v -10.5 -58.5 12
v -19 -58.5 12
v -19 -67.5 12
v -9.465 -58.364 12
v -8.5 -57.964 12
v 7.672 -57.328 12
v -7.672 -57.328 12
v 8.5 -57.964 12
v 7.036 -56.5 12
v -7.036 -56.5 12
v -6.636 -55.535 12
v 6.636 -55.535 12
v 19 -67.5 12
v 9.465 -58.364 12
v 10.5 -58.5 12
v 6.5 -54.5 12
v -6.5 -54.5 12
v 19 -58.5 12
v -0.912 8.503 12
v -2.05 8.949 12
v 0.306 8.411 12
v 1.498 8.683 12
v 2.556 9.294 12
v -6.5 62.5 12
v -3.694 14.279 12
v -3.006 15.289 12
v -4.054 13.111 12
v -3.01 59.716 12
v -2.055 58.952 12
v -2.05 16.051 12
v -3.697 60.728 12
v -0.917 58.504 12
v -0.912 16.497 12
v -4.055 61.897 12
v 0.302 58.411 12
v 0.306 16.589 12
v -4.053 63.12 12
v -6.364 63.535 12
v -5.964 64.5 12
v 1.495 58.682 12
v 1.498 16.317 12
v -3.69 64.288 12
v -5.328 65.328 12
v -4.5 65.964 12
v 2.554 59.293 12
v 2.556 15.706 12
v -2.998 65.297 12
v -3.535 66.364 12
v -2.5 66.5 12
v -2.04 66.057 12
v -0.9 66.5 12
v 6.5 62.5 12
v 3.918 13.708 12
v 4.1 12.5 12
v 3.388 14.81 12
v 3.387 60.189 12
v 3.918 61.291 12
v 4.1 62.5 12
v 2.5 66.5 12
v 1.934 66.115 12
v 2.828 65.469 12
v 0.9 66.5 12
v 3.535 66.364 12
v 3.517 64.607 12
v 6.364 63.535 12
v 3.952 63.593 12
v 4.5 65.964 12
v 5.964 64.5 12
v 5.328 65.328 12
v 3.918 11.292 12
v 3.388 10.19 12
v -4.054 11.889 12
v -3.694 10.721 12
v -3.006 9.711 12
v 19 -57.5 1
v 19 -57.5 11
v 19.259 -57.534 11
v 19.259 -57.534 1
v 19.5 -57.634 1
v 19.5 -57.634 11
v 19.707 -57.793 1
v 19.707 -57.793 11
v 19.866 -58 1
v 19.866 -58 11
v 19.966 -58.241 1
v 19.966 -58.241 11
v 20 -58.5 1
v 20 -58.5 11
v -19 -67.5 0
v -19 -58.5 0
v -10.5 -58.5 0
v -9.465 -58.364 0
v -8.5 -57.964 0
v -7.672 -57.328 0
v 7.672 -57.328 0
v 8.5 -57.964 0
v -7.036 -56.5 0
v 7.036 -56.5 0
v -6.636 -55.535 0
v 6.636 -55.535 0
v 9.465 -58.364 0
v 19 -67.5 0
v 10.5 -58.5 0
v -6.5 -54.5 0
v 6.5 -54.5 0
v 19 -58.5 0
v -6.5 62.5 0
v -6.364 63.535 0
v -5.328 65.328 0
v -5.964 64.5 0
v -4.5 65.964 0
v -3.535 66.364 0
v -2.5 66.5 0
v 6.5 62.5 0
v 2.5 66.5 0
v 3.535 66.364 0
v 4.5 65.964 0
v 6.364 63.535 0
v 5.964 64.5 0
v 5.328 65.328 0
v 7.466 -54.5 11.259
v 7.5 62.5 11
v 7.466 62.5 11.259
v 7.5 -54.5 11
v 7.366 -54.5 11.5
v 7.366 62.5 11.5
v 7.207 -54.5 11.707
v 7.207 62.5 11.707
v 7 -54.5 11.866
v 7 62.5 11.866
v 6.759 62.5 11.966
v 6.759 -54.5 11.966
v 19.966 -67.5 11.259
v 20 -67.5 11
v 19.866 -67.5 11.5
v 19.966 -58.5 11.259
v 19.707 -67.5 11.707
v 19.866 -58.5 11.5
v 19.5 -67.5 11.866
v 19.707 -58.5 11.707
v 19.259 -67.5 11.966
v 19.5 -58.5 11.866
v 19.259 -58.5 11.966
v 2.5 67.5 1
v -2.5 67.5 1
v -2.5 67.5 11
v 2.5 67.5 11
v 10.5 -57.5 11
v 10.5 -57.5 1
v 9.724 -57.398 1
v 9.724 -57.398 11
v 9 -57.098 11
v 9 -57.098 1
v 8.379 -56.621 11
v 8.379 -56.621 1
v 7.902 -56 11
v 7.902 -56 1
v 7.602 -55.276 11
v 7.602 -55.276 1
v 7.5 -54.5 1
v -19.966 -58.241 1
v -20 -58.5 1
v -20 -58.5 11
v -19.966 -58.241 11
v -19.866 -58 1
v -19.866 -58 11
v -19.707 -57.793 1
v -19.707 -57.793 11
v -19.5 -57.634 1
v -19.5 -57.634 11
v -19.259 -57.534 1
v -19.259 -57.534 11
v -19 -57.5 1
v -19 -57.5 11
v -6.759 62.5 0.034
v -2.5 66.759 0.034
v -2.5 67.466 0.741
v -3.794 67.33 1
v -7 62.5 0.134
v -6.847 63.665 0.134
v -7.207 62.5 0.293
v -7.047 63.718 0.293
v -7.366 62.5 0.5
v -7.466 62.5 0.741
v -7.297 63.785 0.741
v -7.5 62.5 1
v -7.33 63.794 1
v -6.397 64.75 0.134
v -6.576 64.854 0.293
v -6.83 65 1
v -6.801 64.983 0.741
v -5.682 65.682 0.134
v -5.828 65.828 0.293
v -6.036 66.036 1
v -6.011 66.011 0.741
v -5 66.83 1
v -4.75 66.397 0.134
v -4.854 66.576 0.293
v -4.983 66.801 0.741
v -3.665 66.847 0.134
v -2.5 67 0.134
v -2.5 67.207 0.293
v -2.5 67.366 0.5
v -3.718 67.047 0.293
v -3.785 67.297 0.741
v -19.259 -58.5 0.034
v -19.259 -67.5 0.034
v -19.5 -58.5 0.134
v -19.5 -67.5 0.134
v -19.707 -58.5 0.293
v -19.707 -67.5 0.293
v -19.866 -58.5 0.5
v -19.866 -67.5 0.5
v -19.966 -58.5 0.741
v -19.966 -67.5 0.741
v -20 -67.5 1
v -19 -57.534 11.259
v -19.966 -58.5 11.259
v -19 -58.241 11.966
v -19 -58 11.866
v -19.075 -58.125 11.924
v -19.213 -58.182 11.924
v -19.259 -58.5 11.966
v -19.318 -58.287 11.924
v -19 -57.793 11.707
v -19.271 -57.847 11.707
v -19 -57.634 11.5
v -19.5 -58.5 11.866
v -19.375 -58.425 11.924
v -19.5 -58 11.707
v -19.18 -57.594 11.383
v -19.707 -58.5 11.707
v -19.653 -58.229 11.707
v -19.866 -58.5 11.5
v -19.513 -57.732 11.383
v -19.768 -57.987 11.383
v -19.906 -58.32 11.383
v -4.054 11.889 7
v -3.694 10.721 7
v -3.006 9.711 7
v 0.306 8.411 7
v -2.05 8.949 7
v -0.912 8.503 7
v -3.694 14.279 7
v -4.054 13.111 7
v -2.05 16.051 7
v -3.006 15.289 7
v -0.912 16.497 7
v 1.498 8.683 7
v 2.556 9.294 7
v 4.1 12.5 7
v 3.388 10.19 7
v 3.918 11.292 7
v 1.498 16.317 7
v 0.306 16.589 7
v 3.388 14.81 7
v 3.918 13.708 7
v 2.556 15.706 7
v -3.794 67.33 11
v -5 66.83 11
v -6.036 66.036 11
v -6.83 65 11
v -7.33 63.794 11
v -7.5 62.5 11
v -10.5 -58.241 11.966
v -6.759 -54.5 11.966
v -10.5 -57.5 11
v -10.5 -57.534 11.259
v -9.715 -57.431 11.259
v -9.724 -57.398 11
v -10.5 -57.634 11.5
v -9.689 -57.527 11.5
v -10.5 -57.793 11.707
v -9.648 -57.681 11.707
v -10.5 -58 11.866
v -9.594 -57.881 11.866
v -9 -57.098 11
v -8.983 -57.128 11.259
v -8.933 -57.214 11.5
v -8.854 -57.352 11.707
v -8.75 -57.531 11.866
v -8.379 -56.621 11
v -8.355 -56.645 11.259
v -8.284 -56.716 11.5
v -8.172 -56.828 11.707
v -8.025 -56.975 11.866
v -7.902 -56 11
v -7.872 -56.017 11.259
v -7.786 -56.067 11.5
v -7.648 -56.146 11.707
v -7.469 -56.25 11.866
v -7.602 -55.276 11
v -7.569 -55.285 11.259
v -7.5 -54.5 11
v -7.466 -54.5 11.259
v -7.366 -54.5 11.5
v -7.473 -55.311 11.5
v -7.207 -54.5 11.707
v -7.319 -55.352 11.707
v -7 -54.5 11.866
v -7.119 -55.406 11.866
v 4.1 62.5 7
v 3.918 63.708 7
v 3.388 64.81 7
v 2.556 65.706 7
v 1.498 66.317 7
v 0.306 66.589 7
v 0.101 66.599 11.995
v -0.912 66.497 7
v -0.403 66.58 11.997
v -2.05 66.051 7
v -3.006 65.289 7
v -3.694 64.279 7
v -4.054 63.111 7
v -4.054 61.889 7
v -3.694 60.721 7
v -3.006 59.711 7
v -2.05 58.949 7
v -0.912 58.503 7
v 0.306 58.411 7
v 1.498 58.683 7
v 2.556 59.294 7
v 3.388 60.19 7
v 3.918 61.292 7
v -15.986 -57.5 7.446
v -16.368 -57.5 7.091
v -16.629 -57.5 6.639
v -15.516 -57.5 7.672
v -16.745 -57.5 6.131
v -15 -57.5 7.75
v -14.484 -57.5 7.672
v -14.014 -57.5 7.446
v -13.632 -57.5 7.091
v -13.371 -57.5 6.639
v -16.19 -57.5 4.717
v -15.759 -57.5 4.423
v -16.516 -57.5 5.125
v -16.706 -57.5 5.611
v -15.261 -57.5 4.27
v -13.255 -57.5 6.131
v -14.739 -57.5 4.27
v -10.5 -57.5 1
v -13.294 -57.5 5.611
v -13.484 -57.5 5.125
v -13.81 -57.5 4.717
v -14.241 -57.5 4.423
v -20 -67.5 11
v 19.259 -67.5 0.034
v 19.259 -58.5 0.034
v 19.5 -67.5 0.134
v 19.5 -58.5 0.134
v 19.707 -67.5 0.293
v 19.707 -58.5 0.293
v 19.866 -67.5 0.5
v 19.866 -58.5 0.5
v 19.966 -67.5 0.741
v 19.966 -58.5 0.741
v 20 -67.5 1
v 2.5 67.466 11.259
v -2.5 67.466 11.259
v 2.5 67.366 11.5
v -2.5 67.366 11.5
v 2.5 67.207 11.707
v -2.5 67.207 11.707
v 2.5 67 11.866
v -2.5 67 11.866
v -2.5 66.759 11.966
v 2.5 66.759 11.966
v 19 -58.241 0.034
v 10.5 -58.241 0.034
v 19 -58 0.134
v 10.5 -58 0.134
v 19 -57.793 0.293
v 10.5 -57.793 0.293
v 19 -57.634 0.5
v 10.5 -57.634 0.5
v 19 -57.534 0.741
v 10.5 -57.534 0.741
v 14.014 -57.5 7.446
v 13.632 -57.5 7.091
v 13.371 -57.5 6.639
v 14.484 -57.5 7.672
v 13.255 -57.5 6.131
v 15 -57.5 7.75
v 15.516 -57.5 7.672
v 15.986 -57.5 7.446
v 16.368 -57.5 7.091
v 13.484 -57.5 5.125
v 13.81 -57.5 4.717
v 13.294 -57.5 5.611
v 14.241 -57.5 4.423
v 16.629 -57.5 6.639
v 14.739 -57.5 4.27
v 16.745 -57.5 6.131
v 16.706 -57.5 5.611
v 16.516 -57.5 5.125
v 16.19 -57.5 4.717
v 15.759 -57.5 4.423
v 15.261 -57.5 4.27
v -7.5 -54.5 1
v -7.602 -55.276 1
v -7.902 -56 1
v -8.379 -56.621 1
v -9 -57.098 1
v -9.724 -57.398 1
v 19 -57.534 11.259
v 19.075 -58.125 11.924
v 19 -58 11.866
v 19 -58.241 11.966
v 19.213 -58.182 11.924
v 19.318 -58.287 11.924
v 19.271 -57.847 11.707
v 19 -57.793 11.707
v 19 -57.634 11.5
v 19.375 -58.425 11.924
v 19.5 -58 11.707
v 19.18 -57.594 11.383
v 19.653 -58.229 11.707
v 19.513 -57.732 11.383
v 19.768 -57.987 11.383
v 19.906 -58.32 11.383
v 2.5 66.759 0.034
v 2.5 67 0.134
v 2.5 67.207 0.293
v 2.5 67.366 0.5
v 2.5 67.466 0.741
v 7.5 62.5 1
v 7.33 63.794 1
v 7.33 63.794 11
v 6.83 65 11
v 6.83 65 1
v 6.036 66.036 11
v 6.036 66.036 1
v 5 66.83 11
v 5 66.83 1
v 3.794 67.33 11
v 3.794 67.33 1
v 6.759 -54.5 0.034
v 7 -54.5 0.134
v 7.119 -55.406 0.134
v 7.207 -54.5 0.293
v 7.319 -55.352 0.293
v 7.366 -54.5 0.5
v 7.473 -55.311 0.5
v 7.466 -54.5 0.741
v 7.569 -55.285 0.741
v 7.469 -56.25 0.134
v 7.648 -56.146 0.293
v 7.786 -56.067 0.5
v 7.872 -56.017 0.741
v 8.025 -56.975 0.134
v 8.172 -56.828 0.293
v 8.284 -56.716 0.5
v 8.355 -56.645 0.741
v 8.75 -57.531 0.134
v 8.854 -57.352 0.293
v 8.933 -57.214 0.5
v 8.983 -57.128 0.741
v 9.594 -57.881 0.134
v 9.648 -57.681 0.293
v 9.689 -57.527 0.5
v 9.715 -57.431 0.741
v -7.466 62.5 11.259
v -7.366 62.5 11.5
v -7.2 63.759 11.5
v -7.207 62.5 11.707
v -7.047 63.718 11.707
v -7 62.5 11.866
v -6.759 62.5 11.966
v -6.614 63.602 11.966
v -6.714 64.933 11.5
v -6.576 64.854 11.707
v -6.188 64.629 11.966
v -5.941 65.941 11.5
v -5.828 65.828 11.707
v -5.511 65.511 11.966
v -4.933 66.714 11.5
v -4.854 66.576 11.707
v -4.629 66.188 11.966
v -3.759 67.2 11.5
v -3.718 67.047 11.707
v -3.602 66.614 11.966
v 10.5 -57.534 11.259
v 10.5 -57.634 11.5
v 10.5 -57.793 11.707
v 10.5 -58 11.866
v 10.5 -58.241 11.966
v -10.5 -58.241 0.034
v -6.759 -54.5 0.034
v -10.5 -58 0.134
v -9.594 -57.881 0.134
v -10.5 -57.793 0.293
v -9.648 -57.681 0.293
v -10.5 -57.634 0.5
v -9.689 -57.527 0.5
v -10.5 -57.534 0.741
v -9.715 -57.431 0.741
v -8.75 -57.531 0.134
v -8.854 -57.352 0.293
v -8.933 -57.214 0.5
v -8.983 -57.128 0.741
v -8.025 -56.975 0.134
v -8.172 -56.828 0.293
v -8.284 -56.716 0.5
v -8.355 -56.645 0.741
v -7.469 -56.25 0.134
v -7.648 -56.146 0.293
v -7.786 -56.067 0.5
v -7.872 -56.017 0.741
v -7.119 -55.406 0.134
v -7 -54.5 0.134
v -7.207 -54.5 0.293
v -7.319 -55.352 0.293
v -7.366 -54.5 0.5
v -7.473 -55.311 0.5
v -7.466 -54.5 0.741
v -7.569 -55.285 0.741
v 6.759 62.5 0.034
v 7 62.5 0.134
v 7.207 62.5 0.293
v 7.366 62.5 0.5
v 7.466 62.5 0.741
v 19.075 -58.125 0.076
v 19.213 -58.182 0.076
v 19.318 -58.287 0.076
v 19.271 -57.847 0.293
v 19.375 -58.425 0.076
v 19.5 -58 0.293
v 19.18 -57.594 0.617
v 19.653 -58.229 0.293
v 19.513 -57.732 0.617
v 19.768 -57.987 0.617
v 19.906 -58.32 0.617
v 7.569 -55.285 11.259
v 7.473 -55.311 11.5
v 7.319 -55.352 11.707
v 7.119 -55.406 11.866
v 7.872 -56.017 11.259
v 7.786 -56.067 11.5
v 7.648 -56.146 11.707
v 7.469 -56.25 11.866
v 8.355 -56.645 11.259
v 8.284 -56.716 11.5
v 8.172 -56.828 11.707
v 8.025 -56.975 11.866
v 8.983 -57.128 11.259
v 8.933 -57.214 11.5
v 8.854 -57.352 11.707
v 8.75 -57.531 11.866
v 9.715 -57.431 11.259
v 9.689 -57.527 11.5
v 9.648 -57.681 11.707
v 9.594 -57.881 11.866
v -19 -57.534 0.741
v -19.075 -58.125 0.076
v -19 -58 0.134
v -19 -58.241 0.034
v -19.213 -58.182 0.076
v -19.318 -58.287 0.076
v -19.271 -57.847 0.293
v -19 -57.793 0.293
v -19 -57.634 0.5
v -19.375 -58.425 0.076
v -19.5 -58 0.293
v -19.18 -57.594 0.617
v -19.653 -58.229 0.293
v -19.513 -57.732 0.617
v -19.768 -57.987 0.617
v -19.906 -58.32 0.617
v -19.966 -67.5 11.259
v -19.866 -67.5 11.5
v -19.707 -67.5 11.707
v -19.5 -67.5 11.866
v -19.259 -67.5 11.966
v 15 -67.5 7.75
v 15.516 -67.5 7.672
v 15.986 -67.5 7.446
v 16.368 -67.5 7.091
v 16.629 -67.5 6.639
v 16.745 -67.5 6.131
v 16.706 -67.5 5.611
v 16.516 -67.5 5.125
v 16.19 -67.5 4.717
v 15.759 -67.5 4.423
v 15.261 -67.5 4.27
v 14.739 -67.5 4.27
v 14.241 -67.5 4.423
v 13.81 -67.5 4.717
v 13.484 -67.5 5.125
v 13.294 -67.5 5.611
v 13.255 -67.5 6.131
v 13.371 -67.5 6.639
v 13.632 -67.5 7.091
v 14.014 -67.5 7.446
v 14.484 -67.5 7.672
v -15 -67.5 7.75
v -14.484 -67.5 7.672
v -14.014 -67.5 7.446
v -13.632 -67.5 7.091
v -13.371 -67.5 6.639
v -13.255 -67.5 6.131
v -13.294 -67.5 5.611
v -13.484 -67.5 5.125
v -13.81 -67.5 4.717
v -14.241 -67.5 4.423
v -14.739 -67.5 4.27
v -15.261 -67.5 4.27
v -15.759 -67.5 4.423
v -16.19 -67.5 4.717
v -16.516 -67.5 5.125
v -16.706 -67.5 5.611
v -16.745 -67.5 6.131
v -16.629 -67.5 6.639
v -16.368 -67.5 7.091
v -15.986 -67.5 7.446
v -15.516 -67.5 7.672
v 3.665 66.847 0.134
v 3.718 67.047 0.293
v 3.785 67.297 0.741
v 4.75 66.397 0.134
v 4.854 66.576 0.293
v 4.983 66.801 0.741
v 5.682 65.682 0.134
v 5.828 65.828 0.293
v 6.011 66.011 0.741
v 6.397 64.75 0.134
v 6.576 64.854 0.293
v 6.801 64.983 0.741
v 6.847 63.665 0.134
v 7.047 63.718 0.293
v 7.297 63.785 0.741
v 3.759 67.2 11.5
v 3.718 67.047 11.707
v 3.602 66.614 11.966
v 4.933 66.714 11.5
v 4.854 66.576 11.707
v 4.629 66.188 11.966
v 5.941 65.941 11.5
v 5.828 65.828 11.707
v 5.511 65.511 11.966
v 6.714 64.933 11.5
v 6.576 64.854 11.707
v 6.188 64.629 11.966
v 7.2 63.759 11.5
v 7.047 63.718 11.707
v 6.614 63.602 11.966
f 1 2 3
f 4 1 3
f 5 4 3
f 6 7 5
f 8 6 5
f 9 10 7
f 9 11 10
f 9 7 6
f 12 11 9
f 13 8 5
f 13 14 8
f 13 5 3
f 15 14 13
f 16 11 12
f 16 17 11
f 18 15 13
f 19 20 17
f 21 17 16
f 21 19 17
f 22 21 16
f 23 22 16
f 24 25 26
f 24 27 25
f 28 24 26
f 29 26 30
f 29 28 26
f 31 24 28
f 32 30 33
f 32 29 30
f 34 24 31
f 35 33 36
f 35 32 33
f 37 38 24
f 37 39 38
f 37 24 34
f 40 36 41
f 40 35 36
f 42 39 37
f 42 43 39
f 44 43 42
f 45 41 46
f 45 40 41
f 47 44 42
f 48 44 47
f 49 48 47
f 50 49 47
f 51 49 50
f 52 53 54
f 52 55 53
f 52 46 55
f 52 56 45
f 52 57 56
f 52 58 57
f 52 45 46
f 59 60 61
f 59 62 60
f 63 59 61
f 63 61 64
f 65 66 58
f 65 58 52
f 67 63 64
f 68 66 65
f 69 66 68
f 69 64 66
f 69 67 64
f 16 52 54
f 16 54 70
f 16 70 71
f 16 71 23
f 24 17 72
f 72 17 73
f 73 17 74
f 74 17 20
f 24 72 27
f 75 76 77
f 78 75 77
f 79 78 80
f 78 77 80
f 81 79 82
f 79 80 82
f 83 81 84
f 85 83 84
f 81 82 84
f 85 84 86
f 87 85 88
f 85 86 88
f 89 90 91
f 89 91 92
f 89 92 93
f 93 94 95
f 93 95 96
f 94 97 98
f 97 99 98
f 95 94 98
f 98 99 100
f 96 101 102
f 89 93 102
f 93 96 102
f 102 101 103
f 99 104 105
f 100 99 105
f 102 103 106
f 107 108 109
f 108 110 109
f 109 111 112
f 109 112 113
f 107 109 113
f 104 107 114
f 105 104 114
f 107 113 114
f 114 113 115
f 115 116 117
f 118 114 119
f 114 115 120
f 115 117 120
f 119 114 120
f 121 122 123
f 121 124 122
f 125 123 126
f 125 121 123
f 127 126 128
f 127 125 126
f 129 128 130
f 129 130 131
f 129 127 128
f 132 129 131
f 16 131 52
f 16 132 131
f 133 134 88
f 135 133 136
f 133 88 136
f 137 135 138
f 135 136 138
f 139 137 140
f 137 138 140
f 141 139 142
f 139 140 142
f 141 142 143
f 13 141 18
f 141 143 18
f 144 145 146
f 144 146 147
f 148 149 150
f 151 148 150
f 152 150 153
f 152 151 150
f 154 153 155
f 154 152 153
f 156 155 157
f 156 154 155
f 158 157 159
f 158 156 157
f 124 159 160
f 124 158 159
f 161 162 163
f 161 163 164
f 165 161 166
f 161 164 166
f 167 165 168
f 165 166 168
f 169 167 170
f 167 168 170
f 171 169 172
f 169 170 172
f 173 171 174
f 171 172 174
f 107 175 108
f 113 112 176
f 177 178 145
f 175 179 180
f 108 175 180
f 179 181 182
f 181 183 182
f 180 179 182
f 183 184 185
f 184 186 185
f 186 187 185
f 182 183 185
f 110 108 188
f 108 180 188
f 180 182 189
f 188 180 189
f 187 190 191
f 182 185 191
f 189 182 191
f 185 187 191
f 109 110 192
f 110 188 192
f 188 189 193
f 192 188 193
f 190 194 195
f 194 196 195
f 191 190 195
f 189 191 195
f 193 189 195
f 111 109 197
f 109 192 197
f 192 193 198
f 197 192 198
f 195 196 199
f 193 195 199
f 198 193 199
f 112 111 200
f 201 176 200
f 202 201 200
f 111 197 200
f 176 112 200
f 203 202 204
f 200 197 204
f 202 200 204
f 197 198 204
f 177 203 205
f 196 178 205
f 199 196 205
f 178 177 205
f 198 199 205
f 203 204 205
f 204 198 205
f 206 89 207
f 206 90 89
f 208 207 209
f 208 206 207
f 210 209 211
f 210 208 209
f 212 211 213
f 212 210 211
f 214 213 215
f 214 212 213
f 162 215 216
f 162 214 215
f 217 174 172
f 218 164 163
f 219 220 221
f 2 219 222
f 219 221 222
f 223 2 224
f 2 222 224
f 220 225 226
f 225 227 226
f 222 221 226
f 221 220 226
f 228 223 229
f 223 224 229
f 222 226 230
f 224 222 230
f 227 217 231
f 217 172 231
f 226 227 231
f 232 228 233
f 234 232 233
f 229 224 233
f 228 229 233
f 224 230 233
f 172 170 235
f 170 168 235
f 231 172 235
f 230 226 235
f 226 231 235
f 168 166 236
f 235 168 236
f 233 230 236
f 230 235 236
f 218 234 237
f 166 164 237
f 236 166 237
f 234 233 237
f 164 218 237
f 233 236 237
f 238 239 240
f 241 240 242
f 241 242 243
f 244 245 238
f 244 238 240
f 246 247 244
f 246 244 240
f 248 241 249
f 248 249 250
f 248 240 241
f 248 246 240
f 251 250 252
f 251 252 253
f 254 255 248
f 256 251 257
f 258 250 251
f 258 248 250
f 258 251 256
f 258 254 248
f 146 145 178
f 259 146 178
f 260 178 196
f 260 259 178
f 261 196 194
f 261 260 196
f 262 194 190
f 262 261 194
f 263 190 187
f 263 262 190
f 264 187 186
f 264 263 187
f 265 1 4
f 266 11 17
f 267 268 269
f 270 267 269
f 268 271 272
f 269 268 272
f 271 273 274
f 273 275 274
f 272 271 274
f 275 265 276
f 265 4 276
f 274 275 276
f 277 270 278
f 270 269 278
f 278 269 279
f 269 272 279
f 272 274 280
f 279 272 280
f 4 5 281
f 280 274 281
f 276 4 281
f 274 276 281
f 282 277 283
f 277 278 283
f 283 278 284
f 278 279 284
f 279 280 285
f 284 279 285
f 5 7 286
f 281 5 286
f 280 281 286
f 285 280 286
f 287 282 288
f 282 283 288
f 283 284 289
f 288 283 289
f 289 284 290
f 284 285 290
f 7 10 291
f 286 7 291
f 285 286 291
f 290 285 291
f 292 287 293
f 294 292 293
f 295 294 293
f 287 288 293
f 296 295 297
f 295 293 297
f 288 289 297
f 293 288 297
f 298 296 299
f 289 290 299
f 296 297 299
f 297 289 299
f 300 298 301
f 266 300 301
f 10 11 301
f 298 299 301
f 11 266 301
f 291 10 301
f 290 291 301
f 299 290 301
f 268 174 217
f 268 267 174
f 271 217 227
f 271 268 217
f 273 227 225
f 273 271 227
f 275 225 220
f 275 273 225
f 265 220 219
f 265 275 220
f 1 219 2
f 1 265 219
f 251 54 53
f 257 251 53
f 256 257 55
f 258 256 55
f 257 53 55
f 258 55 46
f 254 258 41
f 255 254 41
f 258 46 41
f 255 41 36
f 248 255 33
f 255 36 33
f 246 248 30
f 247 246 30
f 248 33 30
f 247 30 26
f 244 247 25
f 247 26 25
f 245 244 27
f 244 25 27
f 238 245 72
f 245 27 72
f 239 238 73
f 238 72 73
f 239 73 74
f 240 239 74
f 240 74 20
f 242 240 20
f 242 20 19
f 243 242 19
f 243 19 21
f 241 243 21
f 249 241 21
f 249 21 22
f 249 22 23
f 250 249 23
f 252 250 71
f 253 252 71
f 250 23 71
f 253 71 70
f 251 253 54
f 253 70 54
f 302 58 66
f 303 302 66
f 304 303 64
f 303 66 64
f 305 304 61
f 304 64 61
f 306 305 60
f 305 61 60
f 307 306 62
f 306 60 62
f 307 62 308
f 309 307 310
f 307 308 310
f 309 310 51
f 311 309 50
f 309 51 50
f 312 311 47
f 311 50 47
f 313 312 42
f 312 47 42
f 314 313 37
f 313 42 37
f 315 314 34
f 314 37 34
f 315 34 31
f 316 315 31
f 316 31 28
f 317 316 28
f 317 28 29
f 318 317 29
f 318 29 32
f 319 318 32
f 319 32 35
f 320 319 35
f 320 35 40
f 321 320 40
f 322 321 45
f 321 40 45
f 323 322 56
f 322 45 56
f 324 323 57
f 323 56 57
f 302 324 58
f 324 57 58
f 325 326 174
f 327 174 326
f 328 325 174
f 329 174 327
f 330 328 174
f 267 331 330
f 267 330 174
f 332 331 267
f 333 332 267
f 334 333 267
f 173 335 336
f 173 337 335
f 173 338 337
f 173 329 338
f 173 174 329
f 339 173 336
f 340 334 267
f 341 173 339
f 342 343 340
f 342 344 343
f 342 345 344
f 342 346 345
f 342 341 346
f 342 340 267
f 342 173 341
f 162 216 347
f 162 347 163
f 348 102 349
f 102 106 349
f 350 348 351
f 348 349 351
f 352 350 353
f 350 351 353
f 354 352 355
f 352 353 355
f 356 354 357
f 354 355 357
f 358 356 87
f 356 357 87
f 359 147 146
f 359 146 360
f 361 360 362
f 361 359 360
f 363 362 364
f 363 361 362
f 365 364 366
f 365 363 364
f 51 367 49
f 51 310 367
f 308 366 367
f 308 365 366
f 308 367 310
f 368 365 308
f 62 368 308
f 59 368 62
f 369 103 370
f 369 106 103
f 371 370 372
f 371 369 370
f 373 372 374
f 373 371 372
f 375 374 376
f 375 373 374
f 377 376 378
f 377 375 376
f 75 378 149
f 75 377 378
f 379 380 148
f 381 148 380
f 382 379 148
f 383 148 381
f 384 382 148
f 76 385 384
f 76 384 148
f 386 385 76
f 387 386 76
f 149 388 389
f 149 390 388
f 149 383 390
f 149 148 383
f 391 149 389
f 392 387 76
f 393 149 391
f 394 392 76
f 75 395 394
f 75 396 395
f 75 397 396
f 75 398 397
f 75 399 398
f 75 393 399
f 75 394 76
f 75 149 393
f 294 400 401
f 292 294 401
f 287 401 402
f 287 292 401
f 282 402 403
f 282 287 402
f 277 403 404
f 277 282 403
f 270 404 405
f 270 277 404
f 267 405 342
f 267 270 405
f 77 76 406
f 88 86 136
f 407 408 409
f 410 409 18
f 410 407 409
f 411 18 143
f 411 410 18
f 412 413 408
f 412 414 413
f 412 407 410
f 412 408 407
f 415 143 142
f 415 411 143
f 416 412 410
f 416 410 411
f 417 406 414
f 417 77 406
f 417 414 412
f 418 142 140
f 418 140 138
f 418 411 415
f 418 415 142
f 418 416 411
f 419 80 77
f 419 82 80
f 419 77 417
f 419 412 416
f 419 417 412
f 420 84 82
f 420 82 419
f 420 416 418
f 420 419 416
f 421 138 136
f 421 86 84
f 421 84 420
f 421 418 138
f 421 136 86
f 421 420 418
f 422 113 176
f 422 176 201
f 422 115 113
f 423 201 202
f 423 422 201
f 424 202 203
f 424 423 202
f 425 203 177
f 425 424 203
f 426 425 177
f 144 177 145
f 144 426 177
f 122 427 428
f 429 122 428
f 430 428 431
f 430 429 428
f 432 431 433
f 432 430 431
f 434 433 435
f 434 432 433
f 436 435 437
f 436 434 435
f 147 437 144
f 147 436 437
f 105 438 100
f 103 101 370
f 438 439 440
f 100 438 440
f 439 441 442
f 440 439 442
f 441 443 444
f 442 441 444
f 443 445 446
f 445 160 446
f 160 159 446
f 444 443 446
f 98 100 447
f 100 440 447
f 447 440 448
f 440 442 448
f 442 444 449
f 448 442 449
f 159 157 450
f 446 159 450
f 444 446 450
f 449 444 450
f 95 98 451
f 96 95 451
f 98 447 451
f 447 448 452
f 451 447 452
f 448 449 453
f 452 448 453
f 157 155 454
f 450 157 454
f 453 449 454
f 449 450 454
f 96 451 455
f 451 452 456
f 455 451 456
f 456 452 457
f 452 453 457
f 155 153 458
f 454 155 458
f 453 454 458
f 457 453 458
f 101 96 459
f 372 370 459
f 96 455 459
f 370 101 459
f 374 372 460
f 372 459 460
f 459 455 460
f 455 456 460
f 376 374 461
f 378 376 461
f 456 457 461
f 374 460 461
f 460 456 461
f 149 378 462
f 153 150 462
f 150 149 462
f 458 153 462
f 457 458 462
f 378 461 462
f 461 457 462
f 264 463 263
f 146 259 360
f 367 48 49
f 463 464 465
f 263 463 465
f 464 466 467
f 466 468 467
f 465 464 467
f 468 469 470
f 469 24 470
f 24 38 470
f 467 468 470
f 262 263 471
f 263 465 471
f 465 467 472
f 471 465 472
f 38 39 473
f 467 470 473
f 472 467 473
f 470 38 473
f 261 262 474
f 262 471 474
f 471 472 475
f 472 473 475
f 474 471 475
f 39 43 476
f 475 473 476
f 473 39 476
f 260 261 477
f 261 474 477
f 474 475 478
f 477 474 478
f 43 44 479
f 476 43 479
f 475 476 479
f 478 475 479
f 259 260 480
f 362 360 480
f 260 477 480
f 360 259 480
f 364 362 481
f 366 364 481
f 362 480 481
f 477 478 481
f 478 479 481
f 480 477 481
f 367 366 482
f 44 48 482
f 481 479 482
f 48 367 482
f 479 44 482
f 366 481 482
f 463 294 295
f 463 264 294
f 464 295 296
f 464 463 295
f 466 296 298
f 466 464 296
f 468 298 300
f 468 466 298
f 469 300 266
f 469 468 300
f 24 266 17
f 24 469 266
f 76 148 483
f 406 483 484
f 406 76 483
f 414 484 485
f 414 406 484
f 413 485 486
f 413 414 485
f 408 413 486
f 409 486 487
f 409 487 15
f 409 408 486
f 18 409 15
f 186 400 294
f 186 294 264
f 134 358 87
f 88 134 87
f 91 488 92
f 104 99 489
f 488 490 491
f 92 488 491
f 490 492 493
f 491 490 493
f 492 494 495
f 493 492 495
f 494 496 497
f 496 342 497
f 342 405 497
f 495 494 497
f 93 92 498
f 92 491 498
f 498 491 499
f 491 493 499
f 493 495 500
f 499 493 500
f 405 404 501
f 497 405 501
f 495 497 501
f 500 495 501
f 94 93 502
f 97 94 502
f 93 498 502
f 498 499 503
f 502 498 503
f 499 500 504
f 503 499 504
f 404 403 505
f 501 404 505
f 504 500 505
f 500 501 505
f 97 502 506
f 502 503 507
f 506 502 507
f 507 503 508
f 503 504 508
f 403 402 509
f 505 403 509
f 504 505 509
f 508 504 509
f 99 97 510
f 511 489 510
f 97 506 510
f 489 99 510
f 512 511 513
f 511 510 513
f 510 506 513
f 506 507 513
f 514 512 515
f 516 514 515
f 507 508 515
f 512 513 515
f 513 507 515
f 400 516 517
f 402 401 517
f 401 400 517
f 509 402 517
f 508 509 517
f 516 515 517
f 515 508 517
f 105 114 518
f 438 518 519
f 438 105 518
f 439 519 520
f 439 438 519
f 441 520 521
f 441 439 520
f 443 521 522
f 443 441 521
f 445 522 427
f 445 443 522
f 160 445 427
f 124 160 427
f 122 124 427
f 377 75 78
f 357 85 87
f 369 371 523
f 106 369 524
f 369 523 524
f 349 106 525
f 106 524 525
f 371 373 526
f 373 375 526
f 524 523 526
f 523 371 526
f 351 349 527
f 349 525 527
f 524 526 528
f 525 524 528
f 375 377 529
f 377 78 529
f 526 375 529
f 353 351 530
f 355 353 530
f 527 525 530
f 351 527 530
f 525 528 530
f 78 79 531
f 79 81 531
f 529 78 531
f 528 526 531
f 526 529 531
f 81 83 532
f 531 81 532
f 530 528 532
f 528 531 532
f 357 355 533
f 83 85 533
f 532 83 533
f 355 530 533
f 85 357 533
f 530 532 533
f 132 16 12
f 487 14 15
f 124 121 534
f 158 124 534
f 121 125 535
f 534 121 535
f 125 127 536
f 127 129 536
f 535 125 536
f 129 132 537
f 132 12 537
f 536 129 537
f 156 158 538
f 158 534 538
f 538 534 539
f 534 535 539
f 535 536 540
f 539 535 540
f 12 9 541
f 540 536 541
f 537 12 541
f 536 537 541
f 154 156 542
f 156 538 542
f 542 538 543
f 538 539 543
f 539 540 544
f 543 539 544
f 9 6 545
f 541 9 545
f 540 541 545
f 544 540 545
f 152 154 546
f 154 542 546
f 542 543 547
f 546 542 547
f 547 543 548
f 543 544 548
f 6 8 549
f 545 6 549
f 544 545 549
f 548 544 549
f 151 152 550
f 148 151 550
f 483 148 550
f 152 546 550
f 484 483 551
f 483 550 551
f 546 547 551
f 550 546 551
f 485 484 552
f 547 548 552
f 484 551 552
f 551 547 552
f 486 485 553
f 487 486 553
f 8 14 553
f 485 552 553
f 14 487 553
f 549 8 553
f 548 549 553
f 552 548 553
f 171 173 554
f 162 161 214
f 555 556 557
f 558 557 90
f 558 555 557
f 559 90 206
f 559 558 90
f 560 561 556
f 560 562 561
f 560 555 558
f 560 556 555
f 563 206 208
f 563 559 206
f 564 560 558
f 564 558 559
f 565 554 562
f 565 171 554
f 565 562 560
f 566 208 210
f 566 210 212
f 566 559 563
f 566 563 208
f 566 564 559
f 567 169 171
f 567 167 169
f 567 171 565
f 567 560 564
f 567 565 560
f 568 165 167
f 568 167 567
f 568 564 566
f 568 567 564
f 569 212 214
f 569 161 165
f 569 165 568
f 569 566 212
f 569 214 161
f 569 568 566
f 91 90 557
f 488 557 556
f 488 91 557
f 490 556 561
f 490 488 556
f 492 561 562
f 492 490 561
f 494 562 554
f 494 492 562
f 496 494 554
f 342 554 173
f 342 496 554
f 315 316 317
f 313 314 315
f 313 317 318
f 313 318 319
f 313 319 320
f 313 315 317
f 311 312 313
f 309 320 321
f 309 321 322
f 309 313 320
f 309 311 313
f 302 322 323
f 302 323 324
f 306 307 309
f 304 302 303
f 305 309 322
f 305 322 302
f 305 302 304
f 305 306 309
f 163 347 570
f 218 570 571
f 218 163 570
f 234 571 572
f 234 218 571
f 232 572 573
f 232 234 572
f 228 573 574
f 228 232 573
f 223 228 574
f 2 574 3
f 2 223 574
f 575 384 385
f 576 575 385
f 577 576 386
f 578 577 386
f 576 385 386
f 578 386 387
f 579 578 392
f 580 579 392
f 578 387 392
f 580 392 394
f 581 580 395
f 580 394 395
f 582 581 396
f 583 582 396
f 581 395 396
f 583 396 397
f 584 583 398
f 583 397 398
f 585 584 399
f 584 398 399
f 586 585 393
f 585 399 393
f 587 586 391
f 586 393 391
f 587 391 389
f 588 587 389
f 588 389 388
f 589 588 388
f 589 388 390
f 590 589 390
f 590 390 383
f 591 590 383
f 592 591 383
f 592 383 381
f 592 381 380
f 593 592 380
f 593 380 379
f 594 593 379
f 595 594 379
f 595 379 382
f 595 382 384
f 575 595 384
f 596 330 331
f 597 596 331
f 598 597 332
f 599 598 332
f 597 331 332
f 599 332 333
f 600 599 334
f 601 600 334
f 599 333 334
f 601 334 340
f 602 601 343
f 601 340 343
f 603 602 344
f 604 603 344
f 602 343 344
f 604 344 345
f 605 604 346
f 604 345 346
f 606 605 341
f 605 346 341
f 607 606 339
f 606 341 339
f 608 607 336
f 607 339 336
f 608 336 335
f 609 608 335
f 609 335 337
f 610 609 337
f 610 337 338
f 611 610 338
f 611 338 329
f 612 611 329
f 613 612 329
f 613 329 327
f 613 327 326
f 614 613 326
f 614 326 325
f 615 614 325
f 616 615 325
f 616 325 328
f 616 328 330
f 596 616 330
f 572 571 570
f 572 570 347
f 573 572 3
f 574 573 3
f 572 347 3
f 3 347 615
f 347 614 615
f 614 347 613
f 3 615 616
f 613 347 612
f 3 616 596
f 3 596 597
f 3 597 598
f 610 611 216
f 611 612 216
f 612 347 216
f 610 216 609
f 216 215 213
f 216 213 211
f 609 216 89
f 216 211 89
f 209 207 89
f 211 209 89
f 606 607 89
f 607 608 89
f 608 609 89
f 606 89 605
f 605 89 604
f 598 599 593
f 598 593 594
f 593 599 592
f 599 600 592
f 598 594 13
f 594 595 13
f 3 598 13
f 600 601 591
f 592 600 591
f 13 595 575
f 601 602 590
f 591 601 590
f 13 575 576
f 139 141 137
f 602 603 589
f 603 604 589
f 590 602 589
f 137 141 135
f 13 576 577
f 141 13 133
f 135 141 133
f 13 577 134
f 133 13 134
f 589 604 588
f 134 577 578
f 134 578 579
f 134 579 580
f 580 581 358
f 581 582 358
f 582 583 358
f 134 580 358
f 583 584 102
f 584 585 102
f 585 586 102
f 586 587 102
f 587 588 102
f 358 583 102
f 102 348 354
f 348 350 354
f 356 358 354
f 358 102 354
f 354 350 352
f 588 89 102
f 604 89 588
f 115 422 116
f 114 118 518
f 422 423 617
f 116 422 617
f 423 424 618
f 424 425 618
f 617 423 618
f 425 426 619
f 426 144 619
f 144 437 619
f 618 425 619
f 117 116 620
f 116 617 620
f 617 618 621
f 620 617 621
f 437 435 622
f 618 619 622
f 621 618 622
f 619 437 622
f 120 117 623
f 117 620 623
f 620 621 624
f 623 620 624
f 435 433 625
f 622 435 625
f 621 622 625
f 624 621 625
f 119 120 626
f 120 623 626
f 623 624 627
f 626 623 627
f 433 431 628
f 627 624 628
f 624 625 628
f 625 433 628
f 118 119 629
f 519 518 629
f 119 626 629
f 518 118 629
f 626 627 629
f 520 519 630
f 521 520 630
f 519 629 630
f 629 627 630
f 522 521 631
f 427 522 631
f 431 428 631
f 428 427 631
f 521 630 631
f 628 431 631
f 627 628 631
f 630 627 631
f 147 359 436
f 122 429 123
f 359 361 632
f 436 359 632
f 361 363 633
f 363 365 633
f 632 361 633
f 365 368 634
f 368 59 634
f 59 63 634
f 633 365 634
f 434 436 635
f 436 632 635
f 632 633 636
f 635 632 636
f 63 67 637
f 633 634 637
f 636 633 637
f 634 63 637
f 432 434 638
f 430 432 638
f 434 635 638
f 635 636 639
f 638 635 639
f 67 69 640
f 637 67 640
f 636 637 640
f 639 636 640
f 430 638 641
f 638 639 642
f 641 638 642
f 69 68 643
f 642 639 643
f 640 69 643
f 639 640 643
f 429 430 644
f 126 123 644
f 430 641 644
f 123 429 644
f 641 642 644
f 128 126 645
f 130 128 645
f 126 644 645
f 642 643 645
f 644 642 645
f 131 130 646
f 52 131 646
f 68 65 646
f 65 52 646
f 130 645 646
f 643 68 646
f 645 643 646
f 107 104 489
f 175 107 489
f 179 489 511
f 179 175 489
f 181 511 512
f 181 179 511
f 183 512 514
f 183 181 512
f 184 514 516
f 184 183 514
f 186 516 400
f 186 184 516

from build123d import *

# Parameters (mm, degrees)
SKETCH_1_W          = 15
SKETCH_1_H          = 135
SKETCH_1_W_2        = 40
SKETCH_1_H_2        = 10
EXTRUDE_1_DEPTH     = 12
SKETCH_3_R          = 1.75
CUT_EXTRUDE_1_DEPTH = 128.157382798
FILLET_1_R          = 3
FILLET_2_R          = 5
FILLET_3_R          = 1
SKETCH_2_R          = 4.1
CUT_EXTRUDE_2_DEPTH = 5


with BuildPart() as part:
    # ｽｹｯﾁ1 → ﾎﾞｽ - 押し出し1 (new body)
    with BuildSketch(Plane.XY):
        Rectangle(SKETCH_1_W, SKETCH_1_H)
        with Locations((0, -62.5)):
            Rectangle(SKETCH_1_W_2, SKETCH_1_H_2)
    extrude(amount=EXTRUDE_1_DEPTH)

    # ｽｹｯﾁ3 → ｶｯﾄ - 押し出し1 (cut, through all)
    with BuildSketch(Plane(origin=(0, -57.5, 0), x_dir=(1, 0, 0), z_dir=(0, 1, 0))):
        with Locations(Location((-15, -6, 0), (0, 0, 270))):
            Circle(SKETCH_3_R)
        with Locations(Location((15, -6, 0), (0, 0, 270))):
            Circle(SKETCH_3_R)
    extrude(amount=-CUT_EXTRUDE_1_DEPTH, mode=Mode.SUBTRACT)

    # ﾌｨﾚｯﾄ1
    fillet_1_edges = [part.edges().sort_by_distance(p)[0] for p in [
        (-7.5, -57.5, 6),
        (7.5, -57.5, 6),
    ]]
    fillet(fillet_1_edges, radius=FILLET_1_R)

    # ﾌｨﾚｯﾄ2
    fillet_2_edges = [part.edges().sort_by_distance(p)[0] for p in [
        (7.5, 67.5, 6),
        (-7.5, 67.5, 6),
    ]]
    fillet(fillet_2_edges, radius=FILLET_2_R)

    # ﾌｨﾚｯﾄ3
    fillet_3_edges = [part.edges().sort_by_distance(p)[0] for p in [
        (20, -57.5, 6),
        (-20, -57.5, 6),
        (-15.25, -57.5, 12),
        (20, -62.5, 12),
        (-20, -62.5, 12),
        (-15.25, -57.5, 0),
        (20, -62.5, 0),
        (-20, -62.5, 0),
        (7.5, 4, 12),
        (7.5, 4, 0),
        (15.25, -57.5, 12),
        (15.25, -57.5, 0),
        (-7.5, 4, 12),
        (-7.5, 4, 0),
        (8.378679656, -56.621320344, 0),
        (8.378679656, -56.621320344, 12),
        (-8.378679656, -56.621320344, 0),
        (-8.378679656, -56.621320344, 12),
        (0, 67.5, 0),
        (0, 67.5, 12),
        (-6.035533906, 66.035533906, 0),
        (6.035533906, 66.035533906, 0),
        (-6.035533906, 66.035533906, 12),
        (6.035533906, 66.035533906, 12),
    ]]
    fillet(fillet_3_edges, radius=FILLET_3_R)

    # ｽｹｯﾁ2 → ｶｯﾄ - 押し出し2 (cut)
    with BuildSketch(Plane.XY.offset(12)):
        with Locations((0, 12.5)):
            Circle(SKETCH_2_R)
        with Locations((0, 62.5)):
            Circle(SKETCH_2_R)
    extrude(amount=-CUT_EXTRUDE_2_DEPTH, mode=Mode.SUBTRACT)


solid = part.part
